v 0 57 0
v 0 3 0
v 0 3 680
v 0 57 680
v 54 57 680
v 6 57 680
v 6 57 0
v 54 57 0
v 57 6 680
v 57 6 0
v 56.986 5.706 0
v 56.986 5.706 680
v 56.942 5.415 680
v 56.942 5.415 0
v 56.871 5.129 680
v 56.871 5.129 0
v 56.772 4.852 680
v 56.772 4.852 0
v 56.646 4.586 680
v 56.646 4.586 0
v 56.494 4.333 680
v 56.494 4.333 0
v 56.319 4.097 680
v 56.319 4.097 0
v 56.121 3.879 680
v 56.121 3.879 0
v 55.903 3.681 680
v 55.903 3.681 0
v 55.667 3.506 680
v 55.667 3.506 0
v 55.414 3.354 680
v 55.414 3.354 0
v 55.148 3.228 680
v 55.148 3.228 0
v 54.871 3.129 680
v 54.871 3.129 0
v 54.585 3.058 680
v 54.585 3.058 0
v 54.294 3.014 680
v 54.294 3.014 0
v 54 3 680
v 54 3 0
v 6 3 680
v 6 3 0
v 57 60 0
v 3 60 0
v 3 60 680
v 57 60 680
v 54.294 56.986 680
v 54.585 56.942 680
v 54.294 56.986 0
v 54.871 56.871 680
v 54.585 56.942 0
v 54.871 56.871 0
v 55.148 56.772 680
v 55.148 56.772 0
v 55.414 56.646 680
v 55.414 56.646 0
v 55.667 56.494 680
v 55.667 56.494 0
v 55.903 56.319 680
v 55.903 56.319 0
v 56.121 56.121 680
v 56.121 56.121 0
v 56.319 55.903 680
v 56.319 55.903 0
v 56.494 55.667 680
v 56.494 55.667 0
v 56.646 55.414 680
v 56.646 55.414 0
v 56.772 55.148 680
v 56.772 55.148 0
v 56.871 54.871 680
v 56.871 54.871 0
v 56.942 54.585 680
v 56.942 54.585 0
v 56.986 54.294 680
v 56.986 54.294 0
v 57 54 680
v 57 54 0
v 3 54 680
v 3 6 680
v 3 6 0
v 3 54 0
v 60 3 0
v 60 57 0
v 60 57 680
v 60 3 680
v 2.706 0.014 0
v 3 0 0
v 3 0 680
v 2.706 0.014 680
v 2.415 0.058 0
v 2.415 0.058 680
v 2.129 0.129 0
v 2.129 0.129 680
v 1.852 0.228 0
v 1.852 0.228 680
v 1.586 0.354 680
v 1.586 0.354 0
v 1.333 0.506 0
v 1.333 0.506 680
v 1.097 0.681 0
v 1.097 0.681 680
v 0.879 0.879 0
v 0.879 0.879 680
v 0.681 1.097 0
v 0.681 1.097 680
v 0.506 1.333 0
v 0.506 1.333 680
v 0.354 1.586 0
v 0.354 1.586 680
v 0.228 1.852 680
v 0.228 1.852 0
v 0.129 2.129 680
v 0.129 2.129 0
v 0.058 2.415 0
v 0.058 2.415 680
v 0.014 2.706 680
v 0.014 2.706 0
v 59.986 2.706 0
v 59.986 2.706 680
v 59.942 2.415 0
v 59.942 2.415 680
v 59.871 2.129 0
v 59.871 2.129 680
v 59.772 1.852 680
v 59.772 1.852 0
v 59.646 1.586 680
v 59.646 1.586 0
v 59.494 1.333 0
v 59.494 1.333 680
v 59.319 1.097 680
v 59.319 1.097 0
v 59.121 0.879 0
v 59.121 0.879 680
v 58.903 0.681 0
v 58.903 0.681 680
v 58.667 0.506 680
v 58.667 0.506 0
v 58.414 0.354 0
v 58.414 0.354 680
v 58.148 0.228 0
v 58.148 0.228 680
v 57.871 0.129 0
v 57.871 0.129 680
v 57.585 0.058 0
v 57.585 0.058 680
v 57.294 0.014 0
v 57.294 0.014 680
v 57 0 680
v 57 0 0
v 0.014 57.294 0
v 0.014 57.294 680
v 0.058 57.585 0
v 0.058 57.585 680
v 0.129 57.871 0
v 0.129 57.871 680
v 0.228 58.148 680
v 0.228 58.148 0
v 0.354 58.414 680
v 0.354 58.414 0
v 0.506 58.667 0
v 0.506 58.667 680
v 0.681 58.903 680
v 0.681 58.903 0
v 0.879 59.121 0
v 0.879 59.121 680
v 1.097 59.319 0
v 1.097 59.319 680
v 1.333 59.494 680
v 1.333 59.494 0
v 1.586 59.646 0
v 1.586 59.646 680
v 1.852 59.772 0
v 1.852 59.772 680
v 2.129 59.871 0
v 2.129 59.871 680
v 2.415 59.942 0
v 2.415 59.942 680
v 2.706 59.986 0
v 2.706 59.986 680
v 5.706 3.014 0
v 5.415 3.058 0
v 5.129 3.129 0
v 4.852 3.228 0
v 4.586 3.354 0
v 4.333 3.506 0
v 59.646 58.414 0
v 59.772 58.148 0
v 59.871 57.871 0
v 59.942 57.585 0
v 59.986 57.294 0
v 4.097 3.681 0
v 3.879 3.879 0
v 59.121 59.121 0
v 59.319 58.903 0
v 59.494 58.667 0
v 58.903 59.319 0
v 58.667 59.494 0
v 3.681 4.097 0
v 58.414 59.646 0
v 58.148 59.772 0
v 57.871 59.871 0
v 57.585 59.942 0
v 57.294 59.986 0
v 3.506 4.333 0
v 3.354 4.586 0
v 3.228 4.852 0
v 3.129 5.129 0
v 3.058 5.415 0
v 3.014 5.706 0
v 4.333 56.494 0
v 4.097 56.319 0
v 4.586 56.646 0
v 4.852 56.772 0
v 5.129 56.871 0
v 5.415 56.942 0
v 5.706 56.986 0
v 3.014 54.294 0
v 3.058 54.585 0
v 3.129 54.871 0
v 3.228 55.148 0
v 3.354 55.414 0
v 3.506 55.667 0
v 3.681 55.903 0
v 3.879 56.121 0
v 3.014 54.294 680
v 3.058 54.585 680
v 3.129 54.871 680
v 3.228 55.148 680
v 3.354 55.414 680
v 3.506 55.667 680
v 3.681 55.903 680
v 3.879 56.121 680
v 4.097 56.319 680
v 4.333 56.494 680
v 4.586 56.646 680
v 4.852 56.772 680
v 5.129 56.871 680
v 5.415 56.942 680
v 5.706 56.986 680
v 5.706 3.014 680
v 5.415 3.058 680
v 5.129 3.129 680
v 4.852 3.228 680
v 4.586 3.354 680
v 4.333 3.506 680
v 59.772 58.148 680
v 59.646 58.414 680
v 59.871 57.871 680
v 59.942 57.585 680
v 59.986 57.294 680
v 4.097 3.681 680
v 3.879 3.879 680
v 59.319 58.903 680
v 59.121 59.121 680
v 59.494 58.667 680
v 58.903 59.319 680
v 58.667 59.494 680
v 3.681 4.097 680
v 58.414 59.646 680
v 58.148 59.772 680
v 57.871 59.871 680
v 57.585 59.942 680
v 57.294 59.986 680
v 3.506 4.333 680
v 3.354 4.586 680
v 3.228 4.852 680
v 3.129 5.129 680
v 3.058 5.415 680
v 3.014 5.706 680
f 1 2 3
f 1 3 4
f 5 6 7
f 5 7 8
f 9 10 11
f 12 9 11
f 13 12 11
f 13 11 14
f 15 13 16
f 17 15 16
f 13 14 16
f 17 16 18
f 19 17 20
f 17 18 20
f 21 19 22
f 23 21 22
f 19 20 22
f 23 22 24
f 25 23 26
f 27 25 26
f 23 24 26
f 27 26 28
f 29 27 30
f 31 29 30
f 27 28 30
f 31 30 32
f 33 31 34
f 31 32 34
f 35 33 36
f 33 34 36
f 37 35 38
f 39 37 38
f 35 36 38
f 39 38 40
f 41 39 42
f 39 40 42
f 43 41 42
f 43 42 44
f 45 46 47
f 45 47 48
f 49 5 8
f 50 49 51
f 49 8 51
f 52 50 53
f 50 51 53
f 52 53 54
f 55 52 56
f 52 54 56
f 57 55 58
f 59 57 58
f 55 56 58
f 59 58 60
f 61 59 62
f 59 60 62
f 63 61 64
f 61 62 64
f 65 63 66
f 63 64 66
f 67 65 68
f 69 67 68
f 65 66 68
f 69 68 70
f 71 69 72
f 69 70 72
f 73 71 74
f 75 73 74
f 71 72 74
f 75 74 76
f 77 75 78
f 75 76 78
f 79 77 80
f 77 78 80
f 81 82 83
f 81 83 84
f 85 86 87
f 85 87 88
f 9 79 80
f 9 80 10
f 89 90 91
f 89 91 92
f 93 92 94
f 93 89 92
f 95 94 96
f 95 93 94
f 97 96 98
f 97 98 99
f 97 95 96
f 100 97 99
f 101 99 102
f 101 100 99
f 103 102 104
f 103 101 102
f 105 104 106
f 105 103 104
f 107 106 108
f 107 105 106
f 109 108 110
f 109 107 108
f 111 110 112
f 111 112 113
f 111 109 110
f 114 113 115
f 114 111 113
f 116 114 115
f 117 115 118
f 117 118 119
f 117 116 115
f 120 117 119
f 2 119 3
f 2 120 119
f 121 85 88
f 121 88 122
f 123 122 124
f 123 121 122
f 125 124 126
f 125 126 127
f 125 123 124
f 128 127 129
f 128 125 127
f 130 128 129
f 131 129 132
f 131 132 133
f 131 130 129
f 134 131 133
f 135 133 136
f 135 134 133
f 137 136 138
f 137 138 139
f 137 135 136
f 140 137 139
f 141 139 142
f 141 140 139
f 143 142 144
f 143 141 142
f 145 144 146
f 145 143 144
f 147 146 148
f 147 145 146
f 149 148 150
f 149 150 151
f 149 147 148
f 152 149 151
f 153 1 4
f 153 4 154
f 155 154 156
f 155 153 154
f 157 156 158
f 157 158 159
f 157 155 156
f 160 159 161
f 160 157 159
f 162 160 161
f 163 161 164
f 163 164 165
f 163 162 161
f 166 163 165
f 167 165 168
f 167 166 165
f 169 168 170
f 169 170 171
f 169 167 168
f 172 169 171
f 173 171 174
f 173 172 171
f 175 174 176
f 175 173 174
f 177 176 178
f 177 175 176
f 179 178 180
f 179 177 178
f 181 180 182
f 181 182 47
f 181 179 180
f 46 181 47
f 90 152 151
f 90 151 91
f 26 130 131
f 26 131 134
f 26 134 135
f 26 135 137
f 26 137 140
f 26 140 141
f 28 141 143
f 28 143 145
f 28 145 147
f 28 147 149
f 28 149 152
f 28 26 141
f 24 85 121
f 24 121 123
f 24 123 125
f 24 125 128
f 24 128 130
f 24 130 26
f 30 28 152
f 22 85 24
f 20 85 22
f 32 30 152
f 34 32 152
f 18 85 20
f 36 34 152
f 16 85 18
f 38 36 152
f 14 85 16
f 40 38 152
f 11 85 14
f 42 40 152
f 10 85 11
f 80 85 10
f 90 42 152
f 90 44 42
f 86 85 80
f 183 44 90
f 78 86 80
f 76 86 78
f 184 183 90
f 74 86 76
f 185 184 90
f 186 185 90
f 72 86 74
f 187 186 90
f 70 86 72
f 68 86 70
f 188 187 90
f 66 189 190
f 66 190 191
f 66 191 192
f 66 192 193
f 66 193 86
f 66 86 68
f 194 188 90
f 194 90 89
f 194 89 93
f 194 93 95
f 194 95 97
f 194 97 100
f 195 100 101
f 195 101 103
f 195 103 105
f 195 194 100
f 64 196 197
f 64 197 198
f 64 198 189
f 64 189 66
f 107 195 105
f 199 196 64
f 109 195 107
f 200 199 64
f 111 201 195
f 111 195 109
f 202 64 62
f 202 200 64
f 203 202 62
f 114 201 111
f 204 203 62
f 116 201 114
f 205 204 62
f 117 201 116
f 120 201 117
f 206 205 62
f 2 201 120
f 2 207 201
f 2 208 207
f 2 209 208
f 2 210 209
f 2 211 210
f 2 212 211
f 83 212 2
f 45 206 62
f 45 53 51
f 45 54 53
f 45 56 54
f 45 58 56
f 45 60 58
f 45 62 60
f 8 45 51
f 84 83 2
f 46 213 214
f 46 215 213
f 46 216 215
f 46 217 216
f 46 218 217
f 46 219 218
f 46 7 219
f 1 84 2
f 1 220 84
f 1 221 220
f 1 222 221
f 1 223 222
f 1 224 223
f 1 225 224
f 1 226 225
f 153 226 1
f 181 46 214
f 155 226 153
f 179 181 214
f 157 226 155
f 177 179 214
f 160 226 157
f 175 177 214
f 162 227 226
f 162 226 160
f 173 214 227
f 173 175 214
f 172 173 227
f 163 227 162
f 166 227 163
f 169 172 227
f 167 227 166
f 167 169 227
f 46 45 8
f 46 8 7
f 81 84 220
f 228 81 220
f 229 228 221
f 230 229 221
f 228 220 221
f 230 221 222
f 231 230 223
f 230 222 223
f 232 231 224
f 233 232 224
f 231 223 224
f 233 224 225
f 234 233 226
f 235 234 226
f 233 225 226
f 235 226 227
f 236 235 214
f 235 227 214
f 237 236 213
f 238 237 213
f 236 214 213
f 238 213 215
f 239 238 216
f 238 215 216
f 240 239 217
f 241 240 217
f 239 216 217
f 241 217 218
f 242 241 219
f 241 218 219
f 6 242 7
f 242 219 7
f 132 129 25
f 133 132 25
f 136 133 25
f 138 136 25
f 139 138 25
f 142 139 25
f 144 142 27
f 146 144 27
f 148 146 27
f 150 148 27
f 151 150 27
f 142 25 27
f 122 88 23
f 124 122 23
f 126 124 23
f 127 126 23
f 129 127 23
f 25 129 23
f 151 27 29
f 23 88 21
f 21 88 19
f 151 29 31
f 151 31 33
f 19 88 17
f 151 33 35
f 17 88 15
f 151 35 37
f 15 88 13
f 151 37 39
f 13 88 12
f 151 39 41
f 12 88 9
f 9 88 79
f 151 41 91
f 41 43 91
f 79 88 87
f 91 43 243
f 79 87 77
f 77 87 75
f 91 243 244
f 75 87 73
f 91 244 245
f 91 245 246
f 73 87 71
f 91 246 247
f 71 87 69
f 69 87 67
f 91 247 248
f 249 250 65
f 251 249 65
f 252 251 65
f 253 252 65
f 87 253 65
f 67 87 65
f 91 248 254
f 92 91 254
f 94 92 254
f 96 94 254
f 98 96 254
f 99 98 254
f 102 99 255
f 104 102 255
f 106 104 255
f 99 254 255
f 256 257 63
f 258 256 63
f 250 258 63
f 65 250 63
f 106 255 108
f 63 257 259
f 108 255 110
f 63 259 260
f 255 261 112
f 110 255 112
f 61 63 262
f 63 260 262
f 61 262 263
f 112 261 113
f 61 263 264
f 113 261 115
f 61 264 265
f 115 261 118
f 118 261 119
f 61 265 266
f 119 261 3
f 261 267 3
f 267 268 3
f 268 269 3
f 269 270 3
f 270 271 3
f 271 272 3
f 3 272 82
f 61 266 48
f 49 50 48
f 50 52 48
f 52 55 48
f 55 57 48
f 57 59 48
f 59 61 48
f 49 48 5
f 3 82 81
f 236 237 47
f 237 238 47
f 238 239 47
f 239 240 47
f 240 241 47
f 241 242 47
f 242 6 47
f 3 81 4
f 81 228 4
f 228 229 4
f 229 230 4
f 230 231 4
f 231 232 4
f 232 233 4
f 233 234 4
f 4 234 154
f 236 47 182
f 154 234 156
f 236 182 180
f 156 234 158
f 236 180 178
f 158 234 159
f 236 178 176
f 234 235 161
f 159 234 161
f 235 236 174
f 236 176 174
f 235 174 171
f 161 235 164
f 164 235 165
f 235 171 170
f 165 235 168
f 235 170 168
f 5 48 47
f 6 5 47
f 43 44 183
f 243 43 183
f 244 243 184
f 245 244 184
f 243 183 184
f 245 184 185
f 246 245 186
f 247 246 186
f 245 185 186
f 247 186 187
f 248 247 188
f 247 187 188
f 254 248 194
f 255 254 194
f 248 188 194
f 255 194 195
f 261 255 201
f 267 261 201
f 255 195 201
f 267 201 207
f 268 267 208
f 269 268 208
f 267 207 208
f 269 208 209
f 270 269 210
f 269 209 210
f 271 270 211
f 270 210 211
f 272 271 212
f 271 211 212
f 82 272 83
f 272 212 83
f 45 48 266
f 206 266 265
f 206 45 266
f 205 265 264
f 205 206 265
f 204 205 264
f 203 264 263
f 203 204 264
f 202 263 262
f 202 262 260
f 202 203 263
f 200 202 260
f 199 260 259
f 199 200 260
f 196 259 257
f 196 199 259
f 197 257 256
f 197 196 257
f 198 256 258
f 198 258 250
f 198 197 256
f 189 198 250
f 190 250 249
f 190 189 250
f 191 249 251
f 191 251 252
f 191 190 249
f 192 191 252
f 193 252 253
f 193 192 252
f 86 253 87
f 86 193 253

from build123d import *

# Parameters (mm, degrees)
DODANIE_WYCI_GNI_CIE1_DEPTH = 680


with BuildPart() as part:
    # Szkic1 → Dodanie-wyciągnięcie1 (new body)
    with BuildSketch(Plane.XY):
        with BuildLine():
            ThreePointArc((0, 57), (0.878679656, 59.121320344), (3, 60))
            Line((3, 60), (57, 60))
            ThreePointArc((57, 60), (59.121320344, 59.121320344), (60, 57))
            Line((60, 57), (60, 3))
            ThreePointArc((60, 3), (59.121320344, 0.878679656), (57, 0))
            Line((57, 0), (3, 0))
            ThreePointArc((3, 0), (0.878679656, 0.878679656), (0, 3))
            Line((0, 3), (0, 57))
        make_face()
        with BuildLine():
            Line((3, 6), (3, 54))
            ThreePointArc((3, 54), (3.878679656, 56.121320344), (6, 57))
            Line((6, 57), (54, 57))
            ThreePointArc((54, 57), (56.121320344, 56.121320344), (57, 54))
            Line((57, 54), (57, 6))
            ThreePointArc((57, 6), (56.121320344, 3.878679656), (54, 3))
            Line((54, 3), (6, 3))
            ThreePointArc((6, 3), (3.878679656, 3.878679656), (3, 6))
        make_face(mode=Mode.SUBTRACT)
    extrude(amount=DODANIE_WYCI_GNI_CIE1_DEPTH)


solid = part.part
